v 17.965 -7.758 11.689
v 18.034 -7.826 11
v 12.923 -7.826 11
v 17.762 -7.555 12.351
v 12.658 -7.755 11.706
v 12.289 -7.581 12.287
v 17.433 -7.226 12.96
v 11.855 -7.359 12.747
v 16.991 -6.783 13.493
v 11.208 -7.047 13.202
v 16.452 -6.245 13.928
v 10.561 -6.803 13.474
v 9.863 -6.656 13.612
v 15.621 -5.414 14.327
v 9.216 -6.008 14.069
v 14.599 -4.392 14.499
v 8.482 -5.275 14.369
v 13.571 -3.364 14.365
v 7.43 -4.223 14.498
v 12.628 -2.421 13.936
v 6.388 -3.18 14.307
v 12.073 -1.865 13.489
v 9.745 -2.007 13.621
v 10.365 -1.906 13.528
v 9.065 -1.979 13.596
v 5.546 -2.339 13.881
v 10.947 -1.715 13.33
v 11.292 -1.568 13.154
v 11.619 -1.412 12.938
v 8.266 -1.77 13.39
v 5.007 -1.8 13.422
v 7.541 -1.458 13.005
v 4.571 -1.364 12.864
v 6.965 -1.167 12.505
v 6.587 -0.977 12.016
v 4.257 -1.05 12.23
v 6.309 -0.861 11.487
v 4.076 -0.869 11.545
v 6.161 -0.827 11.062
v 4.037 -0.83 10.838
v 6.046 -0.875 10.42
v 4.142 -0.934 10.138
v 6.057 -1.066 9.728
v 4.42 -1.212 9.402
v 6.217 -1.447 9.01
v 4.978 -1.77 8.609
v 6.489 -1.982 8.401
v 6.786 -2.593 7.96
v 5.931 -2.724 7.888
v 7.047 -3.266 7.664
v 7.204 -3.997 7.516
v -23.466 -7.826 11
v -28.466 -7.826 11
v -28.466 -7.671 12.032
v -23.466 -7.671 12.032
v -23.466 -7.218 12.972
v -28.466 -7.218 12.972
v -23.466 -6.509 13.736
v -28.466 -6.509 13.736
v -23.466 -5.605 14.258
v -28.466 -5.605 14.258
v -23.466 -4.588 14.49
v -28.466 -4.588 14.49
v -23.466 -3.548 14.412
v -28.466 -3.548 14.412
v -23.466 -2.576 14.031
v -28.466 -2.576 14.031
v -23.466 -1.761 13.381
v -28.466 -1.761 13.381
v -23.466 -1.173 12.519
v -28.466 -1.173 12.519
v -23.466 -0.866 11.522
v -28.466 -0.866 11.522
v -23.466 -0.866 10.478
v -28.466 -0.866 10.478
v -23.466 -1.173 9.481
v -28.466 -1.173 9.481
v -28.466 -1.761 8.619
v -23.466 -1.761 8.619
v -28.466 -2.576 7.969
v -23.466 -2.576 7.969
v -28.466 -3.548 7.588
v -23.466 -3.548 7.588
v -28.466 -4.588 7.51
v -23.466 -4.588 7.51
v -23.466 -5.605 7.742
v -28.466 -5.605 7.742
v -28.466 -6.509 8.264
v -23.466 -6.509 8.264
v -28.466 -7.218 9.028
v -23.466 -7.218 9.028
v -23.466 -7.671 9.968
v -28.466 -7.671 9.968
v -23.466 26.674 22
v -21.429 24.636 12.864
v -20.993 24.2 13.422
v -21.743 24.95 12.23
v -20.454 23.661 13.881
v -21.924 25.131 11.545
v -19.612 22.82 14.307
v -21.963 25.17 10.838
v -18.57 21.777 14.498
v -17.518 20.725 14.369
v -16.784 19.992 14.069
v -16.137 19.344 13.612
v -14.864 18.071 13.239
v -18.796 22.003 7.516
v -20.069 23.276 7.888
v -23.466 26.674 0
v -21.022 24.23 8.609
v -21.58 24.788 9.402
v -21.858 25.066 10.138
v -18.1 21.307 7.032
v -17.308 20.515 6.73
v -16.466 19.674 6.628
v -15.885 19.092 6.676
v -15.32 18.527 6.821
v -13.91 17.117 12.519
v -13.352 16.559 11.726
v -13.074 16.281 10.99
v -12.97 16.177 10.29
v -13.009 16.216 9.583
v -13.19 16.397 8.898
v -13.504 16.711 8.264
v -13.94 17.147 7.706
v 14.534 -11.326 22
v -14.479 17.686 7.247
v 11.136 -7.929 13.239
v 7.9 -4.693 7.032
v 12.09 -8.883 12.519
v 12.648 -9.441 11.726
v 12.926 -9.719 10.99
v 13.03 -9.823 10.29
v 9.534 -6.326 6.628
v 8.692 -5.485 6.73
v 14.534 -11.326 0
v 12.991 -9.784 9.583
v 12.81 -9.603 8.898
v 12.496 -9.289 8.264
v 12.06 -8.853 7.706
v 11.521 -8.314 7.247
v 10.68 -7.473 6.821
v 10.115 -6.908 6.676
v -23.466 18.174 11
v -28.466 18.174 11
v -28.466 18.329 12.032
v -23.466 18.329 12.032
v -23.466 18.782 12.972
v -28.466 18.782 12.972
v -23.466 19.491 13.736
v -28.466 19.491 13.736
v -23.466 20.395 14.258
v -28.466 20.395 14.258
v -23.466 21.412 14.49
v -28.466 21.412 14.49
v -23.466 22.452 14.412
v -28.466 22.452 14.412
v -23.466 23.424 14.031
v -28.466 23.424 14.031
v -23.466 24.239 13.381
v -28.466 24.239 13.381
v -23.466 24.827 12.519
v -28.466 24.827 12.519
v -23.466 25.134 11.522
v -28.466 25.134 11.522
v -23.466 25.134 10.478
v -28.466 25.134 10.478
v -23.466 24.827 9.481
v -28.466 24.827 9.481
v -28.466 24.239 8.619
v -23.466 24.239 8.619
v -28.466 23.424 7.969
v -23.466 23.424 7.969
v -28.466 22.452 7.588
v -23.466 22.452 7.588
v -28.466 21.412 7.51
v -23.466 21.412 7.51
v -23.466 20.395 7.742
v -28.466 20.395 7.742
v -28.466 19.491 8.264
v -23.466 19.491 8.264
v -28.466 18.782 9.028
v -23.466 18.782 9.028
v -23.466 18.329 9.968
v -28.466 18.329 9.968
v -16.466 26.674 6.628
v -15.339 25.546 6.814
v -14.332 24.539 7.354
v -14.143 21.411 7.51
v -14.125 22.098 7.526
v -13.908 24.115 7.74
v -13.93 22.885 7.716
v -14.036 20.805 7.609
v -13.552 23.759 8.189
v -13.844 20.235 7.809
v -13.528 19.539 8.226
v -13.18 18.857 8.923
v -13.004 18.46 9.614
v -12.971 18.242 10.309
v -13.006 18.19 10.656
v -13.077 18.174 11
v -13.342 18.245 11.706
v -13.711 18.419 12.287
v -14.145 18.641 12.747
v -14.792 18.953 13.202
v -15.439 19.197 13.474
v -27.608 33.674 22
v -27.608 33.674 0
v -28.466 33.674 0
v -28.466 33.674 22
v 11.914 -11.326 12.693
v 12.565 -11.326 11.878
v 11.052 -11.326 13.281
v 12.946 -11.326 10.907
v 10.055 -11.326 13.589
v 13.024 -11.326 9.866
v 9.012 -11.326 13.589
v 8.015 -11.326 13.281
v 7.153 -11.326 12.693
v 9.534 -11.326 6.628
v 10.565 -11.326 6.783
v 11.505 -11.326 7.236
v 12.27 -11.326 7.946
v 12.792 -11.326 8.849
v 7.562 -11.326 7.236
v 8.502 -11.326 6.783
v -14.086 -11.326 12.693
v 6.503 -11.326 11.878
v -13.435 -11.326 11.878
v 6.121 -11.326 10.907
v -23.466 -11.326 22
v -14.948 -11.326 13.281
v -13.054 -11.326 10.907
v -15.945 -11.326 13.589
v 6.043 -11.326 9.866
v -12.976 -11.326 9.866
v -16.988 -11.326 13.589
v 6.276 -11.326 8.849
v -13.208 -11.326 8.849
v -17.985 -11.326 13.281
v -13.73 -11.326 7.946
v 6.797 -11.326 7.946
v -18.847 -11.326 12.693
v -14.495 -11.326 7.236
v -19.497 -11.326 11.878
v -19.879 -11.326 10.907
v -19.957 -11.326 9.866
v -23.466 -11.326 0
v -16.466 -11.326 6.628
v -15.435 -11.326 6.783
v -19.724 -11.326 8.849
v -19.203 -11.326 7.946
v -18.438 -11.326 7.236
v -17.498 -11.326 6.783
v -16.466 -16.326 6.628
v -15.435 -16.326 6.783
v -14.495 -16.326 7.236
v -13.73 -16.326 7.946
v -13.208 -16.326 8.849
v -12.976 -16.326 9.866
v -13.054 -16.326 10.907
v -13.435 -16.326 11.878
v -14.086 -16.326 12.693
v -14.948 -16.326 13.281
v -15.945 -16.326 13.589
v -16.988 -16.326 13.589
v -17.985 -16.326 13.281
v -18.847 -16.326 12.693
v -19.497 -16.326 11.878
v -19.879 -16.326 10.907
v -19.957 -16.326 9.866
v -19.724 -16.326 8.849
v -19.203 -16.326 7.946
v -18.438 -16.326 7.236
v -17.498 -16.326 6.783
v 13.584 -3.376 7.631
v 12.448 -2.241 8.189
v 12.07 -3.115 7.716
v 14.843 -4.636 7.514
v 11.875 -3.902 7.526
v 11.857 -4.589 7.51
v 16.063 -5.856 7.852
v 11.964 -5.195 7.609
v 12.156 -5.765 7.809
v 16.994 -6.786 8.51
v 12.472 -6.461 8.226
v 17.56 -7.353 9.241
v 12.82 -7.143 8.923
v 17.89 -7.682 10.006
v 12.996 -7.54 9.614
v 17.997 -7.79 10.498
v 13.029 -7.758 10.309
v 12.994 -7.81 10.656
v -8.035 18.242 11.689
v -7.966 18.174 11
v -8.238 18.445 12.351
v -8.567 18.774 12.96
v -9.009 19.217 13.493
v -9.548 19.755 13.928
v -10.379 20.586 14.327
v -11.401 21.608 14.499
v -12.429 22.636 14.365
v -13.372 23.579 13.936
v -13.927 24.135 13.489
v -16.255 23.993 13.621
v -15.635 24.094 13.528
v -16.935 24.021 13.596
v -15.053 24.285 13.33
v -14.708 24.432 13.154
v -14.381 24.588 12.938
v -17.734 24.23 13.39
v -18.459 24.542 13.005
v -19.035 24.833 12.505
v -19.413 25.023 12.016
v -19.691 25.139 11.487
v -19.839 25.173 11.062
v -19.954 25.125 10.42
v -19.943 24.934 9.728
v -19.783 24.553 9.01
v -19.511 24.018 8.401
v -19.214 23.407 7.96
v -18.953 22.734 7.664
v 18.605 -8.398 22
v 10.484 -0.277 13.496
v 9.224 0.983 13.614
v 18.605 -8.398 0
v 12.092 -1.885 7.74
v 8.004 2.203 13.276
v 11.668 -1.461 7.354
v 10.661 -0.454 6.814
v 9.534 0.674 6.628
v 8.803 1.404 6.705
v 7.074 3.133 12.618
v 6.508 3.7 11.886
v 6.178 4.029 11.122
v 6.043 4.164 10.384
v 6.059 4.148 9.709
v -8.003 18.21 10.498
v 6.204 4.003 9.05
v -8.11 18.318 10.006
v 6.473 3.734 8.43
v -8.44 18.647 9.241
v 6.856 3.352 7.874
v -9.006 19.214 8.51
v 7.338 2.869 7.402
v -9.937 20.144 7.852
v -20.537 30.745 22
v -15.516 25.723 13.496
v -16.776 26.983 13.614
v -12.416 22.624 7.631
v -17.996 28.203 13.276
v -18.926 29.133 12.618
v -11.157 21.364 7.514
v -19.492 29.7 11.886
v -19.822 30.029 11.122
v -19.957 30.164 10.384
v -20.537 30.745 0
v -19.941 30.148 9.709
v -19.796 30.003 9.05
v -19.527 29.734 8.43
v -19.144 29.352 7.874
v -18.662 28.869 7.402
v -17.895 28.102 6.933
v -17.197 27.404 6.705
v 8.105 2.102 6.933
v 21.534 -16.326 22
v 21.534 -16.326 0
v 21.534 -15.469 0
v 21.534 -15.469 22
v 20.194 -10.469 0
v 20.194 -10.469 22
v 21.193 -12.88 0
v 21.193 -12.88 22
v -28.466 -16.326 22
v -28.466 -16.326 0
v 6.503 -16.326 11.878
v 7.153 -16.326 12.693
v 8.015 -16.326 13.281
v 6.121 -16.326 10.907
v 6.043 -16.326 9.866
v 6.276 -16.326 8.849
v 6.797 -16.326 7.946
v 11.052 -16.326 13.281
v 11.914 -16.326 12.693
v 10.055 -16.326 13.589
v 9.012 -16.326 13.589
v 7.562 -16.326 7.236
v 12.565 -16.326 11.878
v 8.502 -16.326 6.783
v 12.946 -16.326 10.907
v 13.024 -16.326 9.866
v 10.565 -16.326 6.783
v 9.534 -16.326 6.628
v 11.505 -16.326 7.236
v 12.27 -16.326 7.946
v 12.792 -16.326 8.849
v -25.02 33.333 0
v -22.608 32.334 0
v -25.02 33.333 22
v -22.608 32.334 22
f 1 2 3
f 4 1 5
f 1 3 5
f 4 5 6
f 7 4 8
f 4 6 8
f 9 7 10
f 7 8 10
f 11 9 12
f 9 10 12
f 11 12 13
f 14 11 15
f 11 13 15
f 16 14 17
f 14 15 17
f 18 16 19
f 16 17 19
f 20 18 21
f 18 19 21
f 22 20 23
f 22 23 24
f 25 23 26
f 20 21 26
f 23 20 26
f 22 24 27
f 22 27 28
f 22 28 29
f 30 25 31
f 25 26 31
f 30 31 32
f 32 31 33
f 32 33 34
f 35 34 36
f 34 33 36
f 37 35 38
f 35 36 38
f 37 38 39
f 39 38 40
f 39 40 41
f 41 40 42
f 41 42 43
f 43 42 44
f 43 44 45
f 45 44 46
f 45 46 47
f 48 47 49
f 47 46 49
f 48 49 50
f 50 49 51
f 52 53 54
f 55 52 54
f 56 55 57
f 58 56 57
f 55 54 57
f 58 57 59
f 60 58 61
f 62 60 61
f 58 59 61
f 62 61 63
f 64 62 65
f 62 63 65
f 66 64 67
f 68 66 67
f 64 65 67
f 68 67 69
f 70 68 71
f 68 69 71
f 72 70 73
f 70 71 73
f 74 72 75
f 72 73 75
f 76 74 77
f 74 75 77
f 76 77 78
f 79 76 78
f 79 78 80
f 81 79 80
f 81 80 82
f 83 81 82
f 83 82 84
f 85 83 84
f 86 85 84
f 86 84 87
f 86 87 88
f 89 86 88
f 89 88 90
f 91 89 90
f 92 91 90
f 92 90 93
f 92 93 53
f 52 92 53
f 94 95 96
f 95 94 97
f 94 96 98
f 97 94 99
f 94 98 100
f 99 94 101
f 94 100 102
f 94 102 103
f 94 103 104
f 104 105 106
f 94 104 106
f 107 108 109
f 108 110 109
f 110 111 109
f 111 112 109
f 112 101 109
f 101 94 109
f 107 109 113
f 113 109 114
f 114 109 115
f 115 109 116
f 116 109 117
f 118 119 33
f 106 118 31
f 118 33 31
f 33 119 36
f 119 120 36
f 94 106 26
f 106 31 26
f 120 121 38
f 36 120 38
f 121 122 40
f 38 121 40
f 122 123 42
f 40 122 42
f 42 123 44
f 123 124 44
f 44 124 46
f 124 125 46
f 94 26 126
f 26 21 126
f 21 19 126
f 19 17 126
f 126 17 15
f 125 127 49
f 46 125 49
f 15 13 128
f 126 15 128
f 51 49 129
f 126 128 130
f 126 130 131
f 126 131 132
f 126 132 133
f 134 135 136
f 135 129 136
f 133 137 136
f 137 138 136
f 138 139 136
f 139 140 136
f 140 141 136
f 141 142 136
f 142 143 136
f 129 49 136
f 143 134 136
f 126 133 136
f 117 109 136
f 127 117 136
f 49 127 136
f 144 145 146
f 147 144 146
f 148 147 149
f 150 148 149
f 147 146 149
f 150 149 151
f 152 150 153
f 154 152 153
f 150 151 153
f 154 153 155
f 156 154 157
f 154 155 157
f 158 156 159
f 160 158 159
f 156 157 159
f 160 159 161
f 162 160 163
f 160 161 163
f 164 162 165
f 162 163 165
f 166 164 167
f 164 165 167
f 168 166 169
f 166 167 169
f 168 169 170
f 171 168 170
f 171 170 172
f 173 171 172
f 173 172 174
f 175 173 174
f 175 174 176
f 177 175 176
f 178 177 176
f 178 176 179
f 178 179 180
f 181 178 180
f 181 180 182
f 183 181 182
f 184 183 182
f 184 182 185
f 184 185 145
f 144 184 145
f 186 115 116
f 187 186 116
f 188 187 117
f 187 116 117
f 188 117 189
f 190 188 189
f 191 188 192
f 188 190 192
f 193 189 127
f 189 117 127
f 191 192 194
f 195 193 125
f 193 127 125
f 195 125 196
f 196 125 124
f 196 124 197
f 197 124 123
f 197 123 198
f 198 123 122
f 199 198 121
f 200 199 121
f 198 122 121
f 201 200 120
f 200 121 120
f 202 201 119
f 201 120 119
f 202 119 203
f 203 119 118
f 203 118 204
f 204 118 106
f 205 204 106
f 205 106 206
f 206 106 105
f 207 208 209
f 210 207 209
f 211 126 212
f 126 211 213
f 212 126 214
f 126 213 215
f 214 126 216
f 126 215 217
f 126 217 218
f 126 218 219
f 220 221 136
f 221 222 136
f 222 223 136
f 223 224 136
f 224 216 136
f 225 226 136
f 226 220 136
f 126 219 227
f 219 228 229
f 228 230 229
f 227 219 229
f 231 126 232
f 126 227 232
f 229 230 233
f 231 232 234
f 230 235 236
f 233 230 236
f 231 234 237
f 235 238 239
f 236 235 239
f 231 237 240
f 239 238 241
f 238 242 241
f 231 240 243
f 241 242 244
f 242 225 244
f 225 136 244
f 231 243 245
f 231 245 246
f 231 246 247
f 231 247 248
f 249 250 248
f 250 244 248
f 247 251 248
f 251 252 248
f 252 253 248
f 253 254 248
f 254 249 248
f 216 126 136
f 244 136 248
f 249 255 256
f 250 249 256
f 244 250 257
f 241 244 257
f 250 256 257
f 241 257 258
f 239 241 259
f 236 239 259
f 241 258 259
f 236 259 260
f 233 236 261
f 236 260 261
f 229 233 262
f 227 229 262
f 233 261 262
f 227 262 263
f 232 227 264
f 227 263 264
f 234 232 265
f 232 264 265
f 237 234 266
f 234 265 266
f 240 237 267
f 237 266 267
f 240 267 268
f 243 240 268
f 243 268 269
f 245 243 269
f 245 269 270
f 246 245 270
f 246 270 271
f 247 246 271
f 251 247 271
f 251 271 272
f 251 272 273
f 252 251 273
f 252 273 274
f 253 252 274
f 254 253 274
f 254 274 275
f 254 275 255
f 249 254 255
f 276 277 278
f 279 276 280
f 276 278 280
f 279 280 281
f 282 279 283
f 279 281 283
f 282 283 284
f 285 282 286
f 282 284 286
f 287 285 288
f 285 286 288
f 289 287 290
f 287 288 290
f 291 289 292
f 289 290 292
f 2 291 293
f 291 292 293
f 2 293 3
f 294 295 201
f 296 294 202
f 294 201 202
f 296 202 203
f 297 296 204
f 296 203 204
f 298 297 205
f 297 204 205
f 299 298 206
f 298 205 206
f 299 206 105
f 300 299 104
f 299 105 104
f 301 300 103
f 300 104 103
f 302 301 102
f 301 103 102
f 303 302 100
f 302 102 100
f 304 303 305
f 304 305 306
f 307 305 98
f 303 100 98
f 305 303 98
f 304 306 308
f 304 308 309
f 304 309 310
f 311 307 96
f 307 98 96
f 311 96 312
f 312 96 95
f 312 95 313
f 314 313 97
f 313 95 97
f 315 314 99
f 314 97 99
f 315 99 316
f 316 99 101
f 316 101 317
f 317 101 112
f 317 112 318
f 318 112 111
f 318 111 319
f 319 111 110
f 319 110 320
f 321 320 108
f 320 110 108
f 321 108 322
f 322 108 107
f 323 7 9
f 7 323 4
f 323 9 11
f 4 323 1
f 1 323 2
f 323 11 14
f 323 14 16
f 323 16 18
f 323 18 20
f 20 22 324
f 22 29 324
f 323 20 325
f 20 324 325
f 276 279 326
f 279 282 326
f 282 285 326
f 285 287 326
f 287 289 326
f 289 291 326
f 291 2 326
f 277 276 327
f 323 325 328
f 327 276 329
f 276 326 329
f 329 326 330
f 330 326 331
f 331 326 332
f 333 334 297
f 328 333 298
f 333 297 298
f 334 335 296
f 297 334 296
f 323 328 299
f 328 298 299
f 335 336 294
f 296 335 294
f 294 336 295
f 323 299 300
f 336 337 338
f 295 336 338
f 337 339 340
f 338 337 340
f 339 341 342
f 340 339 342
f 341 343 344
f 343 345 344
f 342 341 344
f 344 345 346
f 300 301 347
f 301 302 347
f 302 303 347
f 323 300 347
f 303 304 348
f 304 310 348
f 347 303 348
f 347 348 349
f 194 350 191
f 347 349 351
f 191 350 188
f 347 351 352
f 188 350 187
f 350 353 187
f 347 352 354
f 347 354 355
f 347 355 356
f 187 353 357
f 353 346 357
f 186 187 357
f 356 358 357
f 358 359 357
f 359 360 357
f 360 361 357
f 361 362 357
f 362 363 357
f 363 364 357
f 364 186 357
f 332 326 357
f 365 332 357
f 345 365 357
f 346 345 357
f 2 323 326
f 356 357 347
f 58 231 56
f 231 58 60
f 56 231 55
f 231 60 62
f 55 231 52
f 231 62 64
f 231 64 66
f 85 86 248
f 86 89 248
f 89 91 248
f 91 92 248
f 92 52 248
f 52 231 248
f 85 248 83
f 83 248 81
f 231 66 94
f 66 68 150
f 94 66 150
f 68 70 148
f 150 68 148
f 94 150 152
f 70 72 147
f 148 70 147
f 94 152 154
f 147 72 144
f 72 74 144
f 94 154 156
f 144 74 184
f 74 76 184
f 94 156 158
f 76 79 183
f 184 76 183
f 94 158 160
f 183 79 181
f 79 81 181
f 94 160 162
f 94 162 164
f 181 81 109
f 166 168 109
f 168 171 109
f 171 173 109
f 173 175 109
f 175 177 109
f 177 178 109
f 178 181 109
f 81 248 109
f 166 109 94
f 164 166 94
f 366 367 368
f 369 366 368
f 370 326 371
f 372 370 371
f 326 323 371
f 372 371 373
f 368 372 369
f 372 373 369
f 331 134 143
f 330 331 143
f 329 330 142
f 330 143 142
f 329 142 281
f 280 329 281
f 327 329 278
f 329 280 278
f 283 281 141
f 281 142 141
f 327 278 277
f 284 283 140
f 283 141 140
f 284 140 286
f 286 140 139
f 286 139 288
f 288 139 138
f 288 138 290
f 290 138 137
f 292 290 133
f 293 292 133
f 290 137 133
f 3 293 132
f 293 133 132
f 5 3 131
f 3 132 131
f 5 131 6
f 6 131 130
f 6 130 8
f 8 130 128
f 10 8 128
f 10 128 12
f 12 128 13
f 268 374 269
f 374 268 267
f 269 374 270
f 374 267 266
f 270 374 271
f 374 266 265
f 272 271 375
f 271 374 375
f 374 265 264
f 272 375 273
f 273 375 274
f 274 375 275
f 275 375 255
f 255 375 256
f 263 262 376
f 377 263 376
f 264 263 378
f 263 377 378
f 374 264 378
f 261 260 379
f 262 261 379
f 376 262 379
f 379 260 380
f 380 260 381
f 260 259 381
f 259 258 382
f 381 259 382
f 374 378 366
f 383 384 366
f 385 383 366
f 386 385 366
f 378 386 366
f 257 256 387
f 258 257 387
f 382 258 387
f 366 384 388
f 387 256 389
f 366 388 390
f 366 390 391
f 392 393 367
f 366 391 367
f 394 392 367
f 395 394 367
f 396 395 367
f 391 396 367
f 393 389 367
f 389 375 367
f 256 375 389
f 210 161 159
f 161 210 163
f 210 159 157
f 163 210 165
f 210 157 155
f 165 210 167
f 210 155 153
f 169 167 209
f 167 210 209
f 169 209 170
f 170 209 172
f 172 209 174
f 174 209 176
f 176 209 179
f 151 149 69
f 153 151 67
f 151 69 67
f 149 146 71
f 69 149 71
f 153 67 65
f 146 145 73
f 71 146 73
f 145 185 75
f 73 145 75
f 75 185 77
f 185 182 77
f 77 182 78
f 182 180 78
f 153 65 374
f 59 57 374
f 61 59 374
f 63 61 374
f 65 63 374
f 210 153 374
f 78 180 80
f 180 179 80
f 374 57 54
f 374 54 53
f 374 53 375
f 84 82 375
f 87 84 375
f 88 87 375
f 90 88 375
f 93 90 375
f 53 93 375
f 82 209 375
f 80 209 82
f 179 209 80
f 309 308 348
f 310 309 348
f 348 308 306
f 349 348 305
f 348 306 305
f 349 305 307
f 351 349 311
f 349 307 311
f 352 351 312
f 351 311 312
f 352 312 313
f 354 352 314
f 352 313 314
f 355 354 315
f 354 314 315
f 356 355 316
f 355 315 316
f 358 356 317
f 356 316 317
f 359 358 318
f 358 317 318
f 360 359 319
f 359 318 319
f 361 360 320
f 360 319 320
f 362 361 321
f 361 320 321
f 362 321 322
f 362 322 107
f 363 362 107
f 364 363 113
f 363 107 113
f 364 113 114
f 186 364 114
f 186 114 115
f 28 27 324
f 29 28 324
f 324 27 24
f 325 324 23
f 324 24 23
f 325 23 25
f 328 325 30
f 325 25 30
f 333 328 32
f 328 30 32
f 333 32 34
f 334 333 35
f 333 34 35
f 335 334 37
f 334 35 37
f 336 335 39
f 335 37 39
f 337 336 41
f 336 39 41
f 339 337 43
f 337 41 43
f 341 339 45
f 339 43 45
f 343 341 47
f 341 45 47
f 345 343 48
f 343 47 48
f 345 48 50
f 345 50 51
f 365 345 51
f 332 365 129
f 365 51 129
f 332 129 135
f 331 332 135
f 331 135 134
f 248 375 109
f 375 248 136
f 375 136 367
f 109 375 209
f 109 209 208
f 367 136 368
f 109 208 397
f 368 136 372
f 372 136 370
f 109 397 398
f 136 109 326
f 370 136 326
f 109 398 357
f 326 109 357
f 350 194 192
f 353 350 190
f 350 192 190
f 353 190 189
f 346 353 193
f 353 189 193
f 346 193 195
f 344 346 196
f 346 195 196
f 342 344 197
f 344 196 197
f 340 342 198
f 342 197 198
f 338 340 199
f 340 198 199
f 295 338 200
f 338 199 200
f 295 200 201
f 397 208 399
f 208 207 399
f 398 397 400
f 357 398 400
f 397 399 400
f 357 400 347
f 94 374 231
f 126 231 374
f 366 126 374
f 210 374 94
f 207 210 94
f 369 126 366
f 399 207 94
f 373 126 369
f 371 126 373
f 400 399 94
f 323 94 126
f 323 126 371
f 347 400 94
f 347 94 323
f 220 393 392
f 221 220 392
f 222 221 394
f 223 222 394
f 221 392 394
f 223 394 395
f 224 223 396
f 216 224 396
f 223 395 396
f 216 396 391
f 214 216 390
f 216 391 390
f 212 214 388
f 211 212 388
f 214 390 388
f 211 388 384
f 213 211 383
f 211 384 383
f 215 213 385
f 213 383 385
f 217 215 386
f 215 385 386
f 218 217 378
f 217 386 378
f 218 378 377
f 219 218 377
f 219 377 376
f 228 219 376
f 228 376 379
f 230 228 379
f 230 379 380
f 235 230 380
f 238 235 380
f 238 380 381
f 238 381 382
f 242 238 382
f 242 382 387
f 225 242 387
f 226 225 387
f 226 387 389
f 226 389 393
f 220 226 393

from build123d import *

# Parameters (mm, degrees)
BOSS_EXTRUDE1_DEPTH = 22
FILLET1_R           = 10
FILLET2_R           = 10
SKETCH2_R           = 3.5
CUT_EXTRUDE2_DEPTH  = 50
SKETCH4_R           = 3.5
CUT_EXTRUDE3_DEPTH  = 50


with BuildPart() as part:
    # Sketch1 → Boss-Extrude1 (new body)
    with BuildSketch(Plane.XY):
        Polygon((-28.466334251, 33.673519048), (-28.466334251, -16.326480952), (21.533665749, -16.326480952), (21.533665749, -11.326480952), (-23.466334251, 33.673519048), align=None)
        Polygon((14.533665749, -11.326480952), (-23.466334251, -11.326480952), (-23.466334251, 26.673519048), align=None, mode=Mode.SUBTRACT)
    extrude(amount=BOSS_EXTRUDE1_DEPTH)

    # Fillet1
    fillet1_edges = [part.edges().sort_by_distance(p)[0] for p in [
        (-23.466334251, 33.673519048, 11),
    ]]
    fillet(fillet1_edges, radius=FILLET1_R)

    # Fillet2
    fillet2_edges = [part.edges().sort_by_distance(p)[0] for p in [
        (21.533665749, -11.326480952, 11),
    ]]
    fillet(fillet2_edges, radius=FILLET2_R)

    # Sketch2 → Cut-Extrude2 (cut)
    with BuildSketch(Plane.ZY.offset(28.466334251)):
        with Locations(Location((11, 21.673519048, 0), (0, 0, 270))):
            Circle(SKETCH2_R)
        with Locations(Location((11, -4.326480952, 0), (0, 0, 270))):
            Circle(SKETCH2_R)
    extrude(amount=-CUT_EXTRUDE2_DEPTH, mode=Mode.SUBTRACT)

    # Sketch4 → Cut-Extrude3 (cut)
    with BuildSketch(Plane.XZ.offset(16.326480952)):
        with Locations(Location((-16.466334251, 10.12780984, 0), (0, 0, 270))):
            Circle(SKETCH4_R)
        with Locations(Location((9.533665749, 10.12780984, 0), (0, 0, 270))):
            Circle(SKETCH4_R)
    extrude(amount=-CUT_EXTRUDE3_DEPTH, mode=Mode.SUBTRACT)


solid = part.part
